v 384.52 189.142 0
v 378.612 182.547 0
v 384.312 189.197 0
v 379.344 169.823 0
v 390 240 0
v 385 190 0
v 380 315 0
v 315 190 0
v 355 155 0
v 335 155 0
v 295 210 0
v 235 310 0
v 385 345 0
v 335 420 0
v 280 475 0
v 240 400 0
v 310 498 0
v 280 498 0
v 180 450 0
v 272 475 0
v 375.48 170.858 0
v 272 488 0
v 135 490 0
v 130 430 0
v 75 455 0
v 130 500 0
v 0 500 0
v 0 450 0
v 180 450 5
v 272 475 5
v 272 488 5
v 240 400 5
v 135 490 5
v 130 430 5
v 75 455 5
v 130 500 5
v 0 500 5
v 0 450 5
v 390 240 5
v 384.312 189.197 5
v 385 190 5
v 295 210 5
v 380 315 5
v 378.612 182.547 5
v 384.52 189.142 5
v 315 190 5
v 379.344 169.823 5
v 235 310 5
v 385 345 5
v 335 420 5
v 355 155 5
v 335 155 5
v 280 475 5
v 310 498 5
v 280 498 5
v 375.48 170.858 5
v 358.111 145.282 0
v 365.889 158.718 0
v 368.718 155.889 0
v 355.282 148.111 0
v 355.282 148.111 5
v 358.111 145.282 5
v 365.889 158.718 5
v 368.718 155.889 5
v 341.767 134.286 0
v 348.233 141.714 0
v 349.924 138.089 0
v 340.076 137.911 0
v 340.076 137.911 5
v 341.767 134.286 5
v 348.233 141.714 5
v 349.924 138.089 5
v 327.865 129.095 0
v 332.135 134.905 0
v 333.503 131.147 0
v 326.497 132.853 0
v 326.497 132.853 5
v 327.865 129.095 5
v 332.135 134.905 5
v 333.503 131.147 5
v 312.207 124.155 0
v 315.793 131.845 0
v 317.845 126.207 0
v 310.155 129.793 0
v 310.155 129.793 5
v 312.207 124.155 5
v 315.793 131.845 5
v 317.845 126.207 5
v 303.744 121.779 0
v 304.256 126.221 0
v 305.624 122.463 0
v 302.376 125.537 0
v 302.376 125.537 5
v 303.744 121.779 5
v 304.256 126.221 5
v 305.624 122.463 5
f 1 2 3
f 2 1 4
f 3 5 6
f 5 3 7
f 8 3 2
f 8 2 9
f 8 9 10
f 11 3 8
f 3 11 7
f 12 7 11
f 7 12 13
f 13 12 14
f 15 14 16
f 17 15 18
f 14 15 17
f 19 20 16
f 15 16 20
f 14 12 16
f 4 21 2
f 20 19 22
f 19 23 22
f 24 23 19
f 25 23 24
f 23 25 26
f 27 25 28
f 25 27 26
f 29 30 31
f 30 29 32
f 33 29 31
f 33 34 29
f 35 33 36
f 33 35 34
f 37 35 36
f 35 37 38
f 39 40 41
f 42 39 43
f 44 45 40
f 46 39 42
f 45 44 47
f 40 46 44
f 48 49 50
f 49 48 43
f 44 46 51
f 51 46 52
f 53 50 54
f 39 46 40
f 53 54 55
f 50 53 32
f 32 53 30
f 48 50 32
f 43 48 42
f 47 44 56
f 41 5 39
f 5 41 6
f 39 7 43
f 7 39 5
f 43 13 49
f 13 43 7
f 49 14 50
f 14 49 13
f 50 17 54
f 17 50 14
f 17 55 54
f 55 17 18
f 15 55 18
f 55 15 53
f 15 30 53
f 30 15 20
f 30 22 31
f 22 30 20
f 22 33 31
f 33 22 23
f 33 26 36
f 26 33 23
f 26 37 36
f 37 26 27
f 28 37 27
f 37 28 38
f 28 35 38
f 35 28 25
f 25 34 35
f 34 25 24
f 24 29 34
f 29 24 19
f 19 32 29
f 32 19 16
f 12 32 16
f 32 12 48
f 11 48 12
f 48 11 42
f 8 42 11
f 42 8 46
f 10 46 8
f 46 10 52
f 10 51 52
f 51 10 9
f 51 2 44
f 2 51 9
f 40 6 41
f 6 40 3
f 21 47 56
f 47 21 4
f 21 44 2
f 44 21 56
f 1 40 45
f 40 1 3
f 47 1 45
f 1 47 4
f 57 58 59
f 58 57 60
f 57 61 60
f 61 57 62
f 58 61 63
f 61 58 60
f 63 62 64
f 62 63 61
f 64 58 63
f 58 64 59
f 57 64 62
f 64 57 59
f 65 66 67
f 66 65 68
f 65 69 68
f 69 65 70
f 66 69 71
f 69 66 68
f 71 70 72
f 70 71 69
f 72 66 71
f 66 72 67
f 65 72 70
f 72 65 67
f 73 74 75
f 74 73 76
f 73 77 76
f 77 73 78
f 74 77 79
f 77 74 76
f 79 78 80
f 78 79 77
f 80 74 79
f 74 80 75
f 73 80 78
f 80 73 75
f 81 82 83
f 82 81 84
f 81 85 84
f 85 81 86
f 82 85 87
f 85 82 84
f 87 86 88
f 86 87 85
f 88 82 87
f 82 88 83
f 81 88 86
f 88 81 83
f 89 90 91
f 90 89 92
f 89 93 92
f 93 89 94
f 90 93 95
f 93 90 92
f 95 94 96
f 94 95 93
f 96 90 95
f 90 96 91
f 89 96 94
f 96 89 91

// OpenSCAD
// florida_simple_positive_coords.scad
// Simple outline with every coordinate ≥ 0.
// Northwest corner fixed at (0, 500).

module mainland(thickness = 5) {
    linear_extrude(height = thickness)
        polygon(points = [
            [  0, 500],  // northwest corner of the panhandle
            [  0, 450],  // southwest corner of the panhandle (FL‑AL border meets Gulf)
            [75, 455],   // Destin
            [ 130, 430], // Apalachicola National Forest
            [ 180, 450], // northern tip of Apalachee Bay
            [240, 400],  // Cedar Key
            [235, 310],  // Clearwater / St. Pete
            [295, 210],  // Naples
            [315, 190],  // Nothing
            [335, 155],  // Everglades southern tip (Flamingo)
            [355, 155],  // US‑1 leaves mainland (bridge start)
            [385, 190],  // Miami
            [390, 240],  // Palm Beach
            [380, 315],  // Melbourne
            [385, 345],  // Cape Canaveral
            [335, 420],  // Daytona
            [310, 498],  // Jacksonville/top right corner
            [280, 498],  // nothing
            [280, 475],  // woods
            [272, 475],  // bigfoot
            [272, 488],  // Indian ghosts
            [135, 490],  // Chatahootche
            [130, 500]   // tri-state area

        ]);
}


// ——— island helper ———
module island(cx, cy, len, w = 4, ang = 0, thickness = 5) {
    translate([cx, cy, 0])
        rotate(ang)
            linear_extrude(height = thickness)
                square([len, w], center = true);
}


// Preview or render
thickness = 5;

union() {
    mainland(thickness = thickness);
    // Key Biscayne
    island(380, 180, 20, 4, 75);

    // Florida Keys (largest → west)
    island(362, 152, 15, 4, 45, thickness);   // Key Largo
    island(345, 138, 9, 4, 25, thickness);   // Islamorada
    island(330, 132, 6, 4, 20, thickness);   // Marathon
    island(314, 128, 6, 6, 20, thickness);   // Big Pine Key
    island(304,  124, 2, 4, 20, thickness);  // Key West
}
